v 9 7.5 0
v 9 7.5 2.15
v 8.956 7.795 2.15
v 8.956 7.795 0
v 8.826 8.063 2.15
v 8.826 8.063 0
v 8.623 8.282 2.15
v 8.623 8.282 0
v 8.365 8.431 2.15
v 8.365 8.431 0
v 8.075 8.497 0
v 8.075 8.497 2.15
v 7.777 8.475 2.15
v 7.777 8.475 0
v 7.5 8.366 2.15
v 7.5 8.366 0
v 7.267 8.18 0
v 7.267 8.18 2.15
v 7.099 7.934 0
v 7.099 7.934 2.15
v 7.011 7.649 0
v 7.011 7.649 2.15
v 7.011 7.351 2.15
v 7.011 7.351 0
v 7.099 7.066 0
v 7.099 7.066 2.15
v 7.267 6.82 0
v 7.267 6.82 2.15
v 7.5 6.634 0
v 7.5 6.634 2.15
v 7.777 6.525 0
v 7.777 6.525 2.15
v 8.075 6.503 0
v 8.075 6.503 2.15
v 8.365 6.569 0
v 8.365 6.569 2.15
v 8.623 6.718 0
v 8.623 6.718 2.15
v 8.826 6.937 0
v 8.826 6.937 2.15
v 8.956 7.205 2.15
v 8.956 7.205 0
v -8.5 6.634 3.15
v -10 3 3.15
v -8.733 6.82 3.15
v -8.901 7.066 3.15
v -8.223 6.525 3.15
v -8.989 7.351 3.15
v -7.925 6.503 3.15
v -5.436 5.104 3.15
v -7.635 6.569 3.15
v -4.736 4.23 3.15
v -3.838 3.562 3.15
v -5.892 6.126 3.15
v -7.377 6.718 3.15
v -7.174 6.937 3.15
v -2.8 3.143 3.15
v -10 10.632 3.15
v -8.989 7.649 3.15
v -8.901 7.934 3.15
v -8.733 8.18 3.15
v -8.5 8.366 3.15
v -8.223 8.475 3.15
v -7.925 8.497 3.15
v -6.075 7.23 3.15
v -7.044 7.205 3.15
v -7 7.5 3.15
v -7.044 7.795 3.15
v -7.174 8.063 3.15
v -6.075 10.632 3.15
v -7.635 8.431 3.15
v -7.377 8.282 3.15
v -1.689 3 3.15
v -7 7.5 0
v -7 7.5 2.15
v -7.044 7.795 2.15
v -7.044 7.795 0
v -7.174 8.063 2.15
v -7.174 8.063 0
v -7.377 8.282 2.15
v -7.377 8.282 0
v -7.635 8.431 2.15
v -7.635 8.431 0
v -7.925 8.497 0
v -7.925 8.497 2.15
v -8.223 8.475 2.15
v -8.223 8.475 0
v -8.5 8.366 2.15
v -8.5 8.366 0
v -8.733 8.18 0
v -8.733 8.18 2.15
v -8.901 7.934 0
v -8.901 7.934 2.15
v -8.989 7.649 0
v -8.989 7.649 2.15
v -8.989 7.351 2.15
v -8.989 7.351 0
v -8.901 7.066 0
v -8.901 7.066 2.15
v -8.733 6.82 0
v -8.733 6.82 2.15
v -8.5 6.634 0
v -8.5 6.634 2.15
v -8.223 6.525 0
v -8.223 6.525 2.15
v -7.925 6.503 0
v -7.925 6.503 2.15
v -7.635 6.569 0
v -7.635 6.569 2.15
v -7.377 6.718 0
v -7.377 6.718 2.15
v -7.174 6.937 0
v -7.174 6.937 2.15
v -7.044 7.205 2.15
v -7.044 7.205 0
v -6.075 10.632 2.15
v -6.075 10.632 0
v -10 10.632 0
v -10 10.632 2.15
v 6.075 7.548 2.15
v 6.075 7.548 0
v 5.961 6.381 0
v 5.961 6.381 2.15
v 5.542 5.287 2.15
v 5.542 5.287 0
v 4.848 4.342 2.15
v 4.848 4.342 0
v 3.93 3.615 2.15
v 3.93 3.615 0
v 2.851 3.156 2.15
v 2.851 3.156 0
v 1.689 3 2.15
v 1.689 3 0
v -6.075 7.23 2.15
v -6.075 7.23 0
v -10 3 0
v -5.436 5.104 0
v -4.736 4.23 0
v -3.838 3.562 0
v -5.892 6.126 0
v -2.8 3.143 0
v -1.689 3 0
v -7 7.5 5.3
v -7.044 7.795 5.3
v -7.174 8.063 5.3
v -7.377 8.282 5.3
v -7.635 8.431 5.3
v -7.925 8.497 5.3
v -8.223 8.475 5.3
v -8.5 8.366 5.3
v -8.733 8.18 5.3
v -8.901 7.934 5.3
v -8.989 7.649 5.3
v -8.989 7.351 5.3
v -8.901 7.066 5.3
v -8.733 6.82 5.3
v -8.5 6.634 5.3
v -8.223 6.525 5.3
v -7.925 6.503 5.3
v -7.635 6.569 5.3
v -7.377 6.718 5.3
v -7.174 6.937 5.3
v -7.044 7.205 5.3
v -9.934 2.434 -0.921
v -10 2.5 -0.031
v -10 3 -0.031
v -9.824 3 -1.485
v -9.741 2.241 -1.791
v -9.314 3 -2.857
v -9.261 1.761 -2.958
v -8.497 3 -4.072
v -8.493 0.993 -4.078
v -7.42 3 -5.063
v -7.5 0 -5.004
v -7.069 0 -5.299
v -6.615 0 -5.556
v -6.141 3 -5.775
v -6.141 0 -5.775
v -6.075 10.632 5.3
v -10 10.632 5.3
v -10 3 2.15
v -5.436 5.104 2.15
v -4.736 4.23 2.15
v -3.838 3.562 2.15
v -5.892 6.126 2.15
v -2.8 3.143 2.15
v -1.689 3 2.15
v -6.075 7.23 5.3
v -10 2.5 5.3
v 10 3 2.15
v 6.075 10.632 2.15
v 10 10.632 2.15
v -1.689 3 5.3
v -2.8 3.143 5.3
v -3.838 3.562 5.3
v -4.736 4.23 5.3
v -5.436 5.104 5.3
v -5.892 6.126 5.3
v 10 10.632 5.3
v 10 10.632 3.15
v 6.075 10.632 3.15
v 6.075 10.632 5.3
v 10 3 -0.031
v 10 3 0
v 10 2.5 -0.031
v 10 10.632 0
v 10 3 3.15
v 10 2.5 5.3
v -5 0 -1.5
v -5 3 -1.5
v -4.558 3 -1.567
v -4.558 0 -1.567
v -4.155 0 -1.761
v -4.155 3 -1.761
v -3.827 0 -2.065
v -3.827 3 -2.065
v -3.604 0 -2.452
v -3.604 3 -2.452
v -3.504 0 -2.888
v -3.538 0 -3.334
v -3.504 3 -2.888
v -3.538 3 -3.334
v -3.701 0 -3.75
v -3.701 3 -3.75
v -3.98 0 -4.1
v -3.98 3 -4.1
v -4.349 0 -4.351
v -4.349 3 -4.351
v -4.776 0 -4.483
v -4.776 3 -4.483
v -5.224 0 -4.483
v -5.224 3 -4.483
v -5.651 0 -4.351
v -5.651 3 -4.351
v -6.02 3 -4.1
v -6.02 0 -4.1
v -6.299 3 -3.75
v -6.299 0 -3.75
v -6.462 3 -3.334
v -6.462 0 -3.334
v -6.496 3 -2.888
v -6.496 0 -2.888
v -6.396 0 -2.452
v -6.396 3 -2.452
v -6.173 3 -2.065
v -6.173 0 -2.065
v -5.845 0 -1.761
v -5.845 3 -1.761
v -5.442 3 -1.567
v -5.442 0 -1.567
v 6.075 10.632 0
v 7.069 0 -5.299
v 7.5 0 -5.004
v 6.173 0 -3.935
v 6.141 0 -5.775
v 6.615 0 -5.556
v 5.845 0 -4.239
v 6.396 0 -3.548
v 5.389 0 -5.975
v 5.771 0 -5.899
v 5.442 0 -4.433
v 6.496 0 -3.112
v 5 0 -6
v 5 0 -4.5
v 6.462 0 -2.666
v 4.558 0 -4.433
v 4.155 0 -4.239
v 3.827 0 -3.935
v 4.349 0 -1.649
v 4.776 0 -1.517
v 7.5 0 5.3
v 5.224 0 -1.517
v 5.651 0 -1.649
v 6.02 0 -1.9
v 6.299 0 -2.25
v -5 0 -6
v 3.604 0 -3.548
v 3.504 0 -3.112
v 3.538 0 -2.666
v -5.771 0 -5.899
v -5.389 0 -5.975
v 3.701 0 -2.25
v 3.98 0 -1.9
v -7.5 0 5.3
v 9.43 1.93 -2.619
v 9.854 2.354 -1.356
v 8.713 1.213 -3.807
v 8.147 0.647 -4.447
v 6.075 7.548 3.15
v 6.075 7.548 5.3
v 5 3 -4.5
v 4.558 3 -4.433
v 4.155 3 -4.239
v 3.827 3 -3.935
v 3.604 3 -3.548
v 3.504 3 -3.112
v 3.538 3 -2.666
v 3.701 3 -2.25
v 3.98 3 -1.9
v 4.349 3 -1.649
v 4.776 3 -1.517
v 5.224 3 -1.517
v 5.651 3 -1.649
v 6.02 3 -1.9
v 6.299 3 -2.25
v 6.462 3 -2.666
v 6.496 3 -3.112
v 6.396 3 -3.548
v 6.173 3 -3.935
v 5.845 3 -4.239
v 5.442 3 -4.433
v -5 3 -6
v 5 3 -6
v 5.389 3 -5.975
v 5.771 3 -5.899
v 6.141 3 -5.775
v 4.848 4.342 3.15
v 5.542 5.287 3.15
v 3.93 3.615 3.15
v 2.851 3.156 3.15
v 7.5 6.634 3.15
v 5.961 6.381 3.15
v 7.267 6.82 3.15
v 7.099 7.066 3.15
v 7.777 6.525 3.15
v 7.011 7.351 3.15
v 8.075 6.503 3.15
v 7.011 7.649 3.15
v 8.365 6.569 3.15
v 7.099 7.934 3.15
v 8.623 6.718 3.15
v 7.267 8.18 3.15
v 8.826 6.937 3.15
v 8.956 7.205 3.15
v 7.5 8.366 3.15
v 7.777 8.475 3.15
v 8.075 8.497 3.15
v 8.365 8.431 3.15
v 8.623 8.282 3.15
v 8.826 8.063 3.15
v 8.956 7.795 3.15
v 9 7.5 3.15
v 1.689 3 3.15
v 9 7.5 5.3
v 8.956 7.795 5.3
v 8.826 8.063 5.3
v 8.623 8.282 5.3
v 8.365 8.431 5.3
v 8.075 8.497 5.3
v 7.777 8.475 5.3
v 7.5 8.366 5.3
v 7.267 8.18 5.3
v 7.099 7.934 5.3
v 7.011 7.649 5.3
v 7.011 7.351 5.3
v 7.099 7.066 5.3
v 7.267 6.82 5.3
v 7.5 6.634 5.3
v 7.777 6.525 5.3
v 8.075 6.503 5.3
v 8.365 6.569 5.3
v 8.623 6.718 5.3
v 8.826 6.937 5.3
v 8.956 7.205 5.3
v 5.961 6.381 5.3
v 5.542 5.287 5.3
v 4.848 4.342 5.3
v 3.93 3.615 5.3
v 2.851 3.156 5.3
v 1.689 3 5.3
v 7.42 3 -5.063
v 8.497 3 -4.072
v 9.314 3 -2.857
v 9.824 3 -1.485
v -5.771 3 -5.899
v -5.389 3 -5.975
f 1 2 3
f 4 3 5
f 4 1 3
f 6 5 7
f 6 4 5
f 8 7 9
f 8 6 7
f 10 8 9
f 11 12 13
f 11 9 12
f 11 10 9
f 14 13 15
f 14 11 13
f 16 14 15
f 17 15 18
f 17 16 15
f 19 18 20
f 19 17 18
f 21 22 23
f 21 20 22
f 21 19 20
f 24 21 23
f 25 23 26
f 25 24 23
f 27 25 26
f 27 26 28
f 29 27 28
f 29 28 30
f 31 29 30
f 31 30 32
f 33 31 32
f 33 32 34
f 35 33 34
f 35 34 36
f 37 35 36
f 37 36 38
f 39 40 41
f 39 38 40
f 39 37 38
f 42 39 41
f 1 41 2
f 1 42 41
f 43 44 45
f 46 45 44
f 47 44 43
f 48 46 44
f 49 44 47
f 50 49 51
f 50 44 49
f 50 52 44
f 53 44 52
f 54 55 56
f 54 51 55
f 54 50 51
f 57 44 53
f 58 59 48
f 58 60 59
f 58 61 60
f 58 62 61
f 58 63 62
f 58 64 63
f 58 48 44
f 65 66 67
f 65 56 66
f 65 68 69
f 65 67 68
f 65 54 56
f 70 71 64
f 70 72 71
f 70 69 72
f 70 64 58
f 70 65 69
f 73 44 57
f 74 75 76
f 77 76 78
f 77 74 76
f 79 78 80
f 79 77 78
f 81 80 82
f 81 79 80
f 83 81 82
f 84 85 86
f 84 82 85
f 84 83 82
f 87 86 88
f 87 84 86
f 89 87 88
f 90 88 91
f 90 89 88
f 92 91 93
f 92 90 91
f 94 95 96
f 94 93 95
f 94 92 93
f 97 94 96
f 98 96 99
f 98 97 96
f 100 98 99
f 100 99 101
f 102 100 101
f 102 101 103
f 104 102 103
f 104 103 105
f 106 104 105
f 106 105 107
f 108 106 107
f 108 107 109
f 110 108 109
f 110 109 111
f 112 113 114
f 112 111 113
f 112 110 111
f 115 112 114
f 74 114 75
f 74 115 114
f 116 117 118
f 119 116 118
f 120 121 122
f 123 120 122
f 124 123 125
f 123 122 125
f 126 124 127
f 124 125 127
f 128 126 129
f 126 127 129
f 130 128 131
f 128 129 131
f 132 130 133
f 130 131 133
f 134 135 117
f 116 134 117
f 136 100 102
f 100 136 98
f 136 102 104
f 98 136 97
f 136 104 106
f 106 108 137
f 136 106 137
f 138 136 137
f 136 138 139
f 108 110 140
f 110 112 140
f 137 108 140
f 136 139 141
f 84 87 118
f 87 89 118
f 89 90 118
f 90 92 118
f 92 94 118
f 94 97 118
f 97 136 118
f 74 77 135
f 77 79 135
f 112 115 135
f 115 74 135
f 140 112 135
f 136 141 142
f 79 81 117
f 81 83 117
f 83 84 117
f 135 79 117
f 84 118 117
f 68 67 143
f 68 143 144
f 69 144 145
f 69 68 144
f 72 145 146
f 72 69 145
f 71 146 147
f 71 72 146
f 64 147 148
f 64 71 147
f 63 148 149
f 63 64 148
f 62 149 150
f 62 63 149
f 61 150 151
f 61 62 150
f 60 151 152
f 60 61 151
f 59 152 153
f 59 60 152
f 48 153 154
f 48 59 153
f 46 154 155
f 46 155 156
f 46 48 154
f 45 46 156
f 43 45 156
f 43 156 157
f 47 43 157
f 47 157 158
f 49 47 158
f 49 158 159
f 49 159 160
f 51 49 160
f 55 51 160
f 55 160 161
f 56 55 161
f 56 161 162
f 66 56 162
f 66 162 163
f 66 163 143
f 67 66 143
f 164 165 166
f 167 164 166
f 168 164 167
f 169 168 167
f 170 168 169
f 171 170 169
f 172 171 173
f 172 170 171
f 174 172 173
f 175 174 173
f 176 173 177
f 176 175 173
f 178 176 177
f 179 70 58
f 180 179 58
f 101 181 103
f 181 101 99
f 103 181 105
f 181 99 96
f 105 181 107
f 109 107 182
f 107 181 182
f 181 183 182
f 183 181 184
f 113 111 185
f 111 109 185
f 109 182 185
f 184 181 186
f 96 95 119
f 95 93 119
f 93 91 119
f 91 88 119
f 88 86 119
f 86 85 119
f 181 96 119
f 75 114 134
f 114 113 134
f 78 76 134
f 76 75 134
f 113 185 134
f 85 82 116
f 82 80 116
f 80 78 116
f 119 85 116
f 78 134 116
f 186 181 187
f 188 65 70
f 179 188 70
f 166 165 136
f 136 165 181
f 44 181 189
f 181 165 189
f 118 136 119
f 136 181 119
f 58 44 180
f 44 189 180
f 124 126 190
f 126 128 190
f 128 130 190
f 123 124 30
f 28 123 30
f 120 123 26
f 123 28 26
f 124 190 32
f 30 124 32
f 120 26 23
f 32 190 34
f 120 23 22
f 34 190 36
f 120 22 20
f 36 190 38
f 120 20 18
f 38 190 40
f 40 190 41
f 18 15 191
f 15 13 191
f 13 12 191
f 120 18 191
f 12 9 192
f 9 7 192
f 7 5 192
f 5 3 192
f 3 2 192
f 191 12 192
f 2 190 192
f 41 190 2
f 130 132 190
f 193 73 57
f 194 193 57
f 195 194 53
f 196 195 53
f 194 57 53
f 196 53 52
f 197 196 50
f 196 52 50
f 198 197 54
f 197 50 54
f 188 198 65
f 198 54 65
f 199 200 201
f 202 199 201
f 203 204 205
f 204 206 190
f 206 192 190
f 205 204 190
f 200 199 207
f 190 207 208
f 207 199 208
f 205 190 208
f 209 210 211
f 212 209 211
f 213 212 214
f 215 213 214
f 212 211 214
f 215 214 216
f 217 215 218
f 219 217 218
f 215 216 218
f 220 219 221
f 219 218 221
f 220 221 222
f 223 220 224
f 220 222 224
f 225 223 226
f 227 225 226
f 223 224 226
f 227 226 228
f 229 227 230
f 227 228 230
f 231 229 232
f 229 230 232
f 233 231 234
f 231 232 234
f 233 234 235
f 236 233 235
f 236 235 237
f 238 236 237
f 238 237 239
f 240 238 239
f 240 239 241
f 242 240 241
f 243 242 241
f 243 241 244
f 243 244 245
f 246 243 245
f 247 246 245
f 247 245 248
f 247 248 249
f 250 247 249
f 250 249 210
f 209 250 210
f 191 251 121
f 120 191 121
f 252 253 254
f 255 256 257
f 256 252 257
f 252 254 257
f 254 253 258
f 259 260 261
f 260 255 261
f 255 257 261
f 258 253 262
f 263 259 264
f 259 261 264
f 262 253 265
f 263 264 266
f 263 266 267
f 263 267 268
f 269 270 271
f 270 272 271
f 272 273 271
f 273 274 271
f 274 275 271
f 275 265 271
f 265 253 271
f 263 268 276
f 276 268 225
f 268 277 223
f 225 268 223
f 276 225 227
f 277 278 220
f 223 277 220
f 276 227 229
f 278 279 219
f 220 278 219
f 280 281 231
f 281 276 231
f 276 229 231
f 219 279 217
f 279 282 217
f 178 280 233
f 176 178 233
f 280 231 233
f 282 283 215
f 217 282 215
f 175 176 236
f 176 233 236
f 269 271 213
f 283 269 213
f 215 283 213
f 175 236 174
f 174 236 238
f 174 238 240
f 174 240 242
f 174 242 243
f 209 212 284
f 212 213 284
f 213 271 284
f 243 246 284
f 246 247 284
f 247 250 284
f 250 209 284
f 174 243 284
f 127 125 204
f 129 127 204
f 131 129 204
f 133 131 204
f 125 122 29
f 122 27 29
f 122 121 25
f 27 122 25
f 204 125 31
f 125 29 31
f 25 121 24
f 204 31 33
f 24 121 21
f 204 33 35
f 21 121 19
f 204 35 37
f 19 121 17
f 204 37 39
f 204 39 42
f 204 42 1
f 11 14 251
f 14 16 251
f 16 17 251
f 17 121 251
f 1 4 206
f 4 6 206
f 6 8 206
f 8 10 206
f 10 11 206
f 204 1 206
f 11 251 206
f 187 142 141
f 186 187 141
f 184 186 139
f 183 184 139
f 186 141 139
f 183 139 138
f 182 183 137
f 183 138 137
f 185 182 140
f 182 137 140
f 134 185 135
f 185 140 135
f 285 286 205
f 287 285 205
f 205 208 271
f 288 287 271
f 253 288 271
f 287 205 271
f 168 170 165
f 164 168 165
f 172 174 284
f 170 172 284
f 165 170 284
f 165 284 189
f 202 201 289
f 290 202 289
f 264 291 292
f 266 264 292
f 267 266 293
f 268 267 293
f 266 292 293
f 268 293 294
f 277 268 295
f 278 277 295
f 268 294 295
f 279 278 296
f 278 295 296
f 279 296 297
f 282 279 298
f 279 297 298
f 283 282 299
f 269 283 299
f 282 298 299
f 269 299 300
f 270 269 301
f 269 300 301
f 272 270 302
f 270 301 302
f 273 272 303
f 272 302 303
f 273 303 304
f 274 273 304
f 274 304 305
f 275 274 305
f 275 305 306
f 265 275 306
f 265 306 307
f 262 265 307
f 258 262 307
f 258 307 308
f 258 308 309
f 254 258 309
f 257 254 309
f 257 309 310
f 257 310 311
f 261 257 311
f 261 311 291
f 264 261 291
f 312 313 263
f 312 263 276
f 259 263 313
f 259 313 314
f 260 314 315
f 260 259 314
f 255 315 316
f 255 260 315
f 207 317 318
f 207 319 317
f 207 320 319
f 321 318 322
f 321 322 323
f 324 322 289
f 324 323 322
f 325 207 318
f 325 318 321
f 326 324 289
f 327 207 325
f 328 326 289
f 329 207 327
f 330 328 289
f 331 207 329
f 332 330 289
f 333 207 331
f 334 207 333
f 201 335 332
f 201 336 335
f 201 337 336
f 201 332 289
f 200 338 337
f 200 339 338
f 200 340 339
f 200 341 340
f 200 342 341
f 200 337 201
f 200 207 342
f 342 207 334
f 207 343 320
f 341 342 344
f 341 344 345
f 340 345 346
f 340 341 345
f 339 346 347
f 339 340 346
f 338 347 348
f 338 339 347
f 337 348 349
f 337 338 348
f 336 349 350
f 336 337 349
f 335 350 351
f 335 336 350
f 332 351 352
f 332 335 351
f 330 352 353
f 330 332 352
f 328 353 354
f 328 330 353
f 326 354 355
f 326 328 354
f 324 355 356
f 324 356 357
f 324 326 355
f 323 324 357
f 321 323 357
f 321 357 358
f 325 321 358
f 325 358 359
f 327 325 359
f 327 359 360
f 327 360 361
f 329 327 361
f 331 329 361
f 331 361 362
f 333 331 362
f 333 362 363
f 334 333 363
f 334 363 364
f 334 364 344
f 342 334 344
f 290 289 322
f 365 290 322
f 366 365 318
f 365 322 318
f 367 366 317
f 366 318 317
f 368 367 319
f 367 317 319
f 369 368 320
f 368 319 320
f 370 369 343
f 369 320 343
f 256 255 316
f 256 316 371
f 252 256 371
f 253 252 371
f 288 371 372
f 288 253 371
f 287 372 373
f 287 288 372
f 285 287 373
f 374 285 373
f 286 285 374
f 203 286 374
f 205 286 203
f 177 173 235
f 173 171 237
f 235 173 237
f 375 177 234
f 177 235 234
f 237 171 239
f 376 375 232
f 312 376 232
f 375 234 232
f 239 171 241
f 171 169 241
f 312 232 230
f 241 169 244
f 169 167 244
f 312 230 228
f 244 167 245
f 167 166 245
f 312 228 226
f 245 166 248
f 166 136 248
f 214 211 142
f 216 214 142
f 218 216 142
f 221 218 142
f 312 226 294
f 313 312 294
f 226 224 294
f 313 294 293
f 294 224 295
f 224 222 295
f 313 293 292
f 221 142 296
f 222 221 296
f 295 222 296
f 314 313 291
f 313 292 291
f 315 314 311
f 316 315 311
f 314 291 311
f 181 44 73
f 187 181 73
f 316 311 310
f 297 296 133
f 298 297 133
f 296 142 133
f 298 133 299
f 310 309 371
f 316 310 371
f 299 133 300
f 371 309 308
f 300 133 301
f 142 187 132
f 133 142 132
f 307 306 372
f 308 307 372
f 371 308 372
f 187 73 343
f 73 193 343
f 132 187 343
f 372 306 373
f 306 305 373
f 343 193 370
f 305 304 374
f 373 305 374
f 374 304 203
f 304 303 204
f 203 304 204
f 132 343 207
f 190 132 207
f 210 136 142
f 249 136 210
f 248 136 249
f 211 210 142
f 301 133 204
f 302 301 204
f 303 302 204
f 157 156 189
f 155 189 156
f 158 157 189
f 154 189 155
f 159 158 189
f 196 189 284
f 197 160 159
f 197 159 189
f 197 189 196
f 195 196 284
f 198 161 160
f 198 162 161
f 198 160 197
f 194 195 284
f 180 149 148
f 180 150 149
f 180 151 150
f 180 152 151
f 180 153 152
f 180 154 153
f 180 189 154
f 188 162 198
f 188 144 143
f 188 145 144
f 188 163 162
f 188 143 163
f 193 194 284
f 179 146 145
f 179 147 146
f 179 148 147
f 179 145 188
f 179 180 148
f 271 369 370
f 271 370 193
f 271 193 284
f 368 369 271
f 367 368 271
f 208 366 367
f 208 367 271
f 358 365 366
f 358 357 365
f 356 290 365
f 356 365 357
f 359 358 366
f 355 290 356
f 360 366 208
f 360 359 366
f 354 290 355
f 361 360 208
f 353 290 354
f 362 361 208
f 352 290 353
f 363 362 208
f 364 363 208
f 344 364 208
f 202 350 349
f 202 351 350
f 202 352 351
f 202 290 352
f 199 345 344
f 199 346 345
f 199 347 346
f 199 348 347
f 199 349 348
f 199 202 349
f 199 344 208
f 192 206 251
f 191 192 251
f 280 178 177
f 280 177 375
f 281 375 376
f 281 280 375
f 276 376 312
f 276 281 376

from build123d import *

# Parameters (mm, degrees)
SKETCH1_R           = 1
BOSS_EXTRUDE1_DEPTH = 5.3
SKETCH2_W           = 1
SKETCH2_H           = 7.632118098
CUT_EXTRUDE1_DEPTH  = 24.262242696
BOSS_EXTRUDE2_DEPTH = 6
SKETCH5_R           = 1.5
CUT_EXTRUDE2_DEPTH  = 14.937332122
CUT_EXTRUDE3_START  = -3
CUT_EXTRUDE3_DEPTH  = 3


# Read off the part's stored shape, not the designer's step: Cut-Extrude3
with BuildPart() as part:
    # Sketch1 → Boss-Extrude1 (new body)
    with BuildSketch(Plane.XY):
        with BuildLine():
            Line((-7.5, 0), (7.5, 0))
            Line((7.5, 0), (10, 2.5))
            Line((10, 2.5), (10, 10.632118098))
            Line((10, 10.632118098), (6.075, 10.632118098))
            Line((6.075, 10.632118098), (6.075, 7.547815402))
            ThreePointArc((6.075, 7.547815402), (4.848419821, 4.342215517), (1.689491671, 3))
            Line((1.689491671, 3), (-1.689458819, 3))
            ThreePointArc((-1.689458819, 3), (-4.736103523, 4.229921298), (-6.075, 7.230272374))
            Line((-6.075, 7.230272374), (-6.075, 10.632118098))
            Line((-6.075, 10.632118098), (-10, 10.632118098))
            Line((-10, 10.632118098), (-10, 2.5))
            Line((-10, 2.5), (-7.5, 0))
        make_face()
        with Locations((-8, 7.5)):
            Circle(SKETCH1_R, mode=Mode.SUBTRACT)
        with Locations((8, 7.5)):
            Circle(SKETCH1_R, mode=Mode.SUBTRACT)
    extrude(amount=BOSS_EXTRUDE1_DEPTH)

    # Sketch2 → Cut-Extrude1 (cut, through all)
    with BuildSketch(Plane(origin=(10, 0, 0), x_dir=(0, 0, -1), z_dir=(1, 0, 0))):
        with Locations((-2.65, 6.816059049)):
            Rectangle(SKETCH2_W, SKETCH2_H)
    extrude(amount=-CUT_EXTRUDE1_DEPTH, mode=Mode.SUBTRACT)

    # Sketch3 → Boss-Extrude2 (add)
    with BuildSketch(Plane(origin=(0, 0, 0), x_dir=(-1, 0, 0), z_dir=(0, 0, -1))):
        Polygon((10, 2.5), (10, 3), (1.689458819, 3), (-1.689491671, 3), (-10, 3), (-10, 2.5), (-7.5, 0), (7.5, 0), align=None)
    extrude(amount=BOSS_EXTRUDE2_DEPTH)

    # Sketch5 → Cut-Extrude2 (cut, through all)
    with BuildSketch(Plane(origin=(0, 3, 0), x_dir=(1, 0, 0), z_dir=(0, 1, 0))):
        with Locations(Location((-5, 3, 0), (0, 0, 270))):
            Circle(SKETCH5_R)
        with Locations(Location((5, 3, 0), (0, 0, 90))):
            Circle(SKETCH5_R)
    extrude(amount=-CUT_EXTRUDE2_DEPTH, mode=Mode.SUBTRACT)

    # Cut-Extrude3 outline → Cut-Extrude3 (cut)
    with BuildSketch(Plane(origin=(0, 3, 0), x_dir=(1, 0, 0), z_dir=(0, 1, 0)).offset(CUT_EXTRUDE3_START)):
        with BuildLine():
            ThreePointArc((-6.14052533, 5.774743587), (-5.581278436, 5.94314719), (-5, 6))
            Line((-5, 6), (-10, 6))
            Line((-10, 6), (-10, 0.031065848))
            ThreePointArc((-10, 0.031065848), (-8.941597101, 3.488399471), (-6.14052533, 5.774743587))
        make_face()
        with BuildLine():
            ThreePointArc((6.14052533, 5.774743587), (8.941597101, 3.488399471), (10, 0.031065848))
            Line((10, 0.031065848), (10, 6))
            Line((10, 6), (5, 6))
            ThreePointArc((5, 6), (5.581278436, 5.94314719), (6.14052533, 5.774743587))
        make_face()
    extrude(amount=CUT_EXTRUDE3_DEPTH, mode=Mode.SUBTRACT)


solid = part.part
